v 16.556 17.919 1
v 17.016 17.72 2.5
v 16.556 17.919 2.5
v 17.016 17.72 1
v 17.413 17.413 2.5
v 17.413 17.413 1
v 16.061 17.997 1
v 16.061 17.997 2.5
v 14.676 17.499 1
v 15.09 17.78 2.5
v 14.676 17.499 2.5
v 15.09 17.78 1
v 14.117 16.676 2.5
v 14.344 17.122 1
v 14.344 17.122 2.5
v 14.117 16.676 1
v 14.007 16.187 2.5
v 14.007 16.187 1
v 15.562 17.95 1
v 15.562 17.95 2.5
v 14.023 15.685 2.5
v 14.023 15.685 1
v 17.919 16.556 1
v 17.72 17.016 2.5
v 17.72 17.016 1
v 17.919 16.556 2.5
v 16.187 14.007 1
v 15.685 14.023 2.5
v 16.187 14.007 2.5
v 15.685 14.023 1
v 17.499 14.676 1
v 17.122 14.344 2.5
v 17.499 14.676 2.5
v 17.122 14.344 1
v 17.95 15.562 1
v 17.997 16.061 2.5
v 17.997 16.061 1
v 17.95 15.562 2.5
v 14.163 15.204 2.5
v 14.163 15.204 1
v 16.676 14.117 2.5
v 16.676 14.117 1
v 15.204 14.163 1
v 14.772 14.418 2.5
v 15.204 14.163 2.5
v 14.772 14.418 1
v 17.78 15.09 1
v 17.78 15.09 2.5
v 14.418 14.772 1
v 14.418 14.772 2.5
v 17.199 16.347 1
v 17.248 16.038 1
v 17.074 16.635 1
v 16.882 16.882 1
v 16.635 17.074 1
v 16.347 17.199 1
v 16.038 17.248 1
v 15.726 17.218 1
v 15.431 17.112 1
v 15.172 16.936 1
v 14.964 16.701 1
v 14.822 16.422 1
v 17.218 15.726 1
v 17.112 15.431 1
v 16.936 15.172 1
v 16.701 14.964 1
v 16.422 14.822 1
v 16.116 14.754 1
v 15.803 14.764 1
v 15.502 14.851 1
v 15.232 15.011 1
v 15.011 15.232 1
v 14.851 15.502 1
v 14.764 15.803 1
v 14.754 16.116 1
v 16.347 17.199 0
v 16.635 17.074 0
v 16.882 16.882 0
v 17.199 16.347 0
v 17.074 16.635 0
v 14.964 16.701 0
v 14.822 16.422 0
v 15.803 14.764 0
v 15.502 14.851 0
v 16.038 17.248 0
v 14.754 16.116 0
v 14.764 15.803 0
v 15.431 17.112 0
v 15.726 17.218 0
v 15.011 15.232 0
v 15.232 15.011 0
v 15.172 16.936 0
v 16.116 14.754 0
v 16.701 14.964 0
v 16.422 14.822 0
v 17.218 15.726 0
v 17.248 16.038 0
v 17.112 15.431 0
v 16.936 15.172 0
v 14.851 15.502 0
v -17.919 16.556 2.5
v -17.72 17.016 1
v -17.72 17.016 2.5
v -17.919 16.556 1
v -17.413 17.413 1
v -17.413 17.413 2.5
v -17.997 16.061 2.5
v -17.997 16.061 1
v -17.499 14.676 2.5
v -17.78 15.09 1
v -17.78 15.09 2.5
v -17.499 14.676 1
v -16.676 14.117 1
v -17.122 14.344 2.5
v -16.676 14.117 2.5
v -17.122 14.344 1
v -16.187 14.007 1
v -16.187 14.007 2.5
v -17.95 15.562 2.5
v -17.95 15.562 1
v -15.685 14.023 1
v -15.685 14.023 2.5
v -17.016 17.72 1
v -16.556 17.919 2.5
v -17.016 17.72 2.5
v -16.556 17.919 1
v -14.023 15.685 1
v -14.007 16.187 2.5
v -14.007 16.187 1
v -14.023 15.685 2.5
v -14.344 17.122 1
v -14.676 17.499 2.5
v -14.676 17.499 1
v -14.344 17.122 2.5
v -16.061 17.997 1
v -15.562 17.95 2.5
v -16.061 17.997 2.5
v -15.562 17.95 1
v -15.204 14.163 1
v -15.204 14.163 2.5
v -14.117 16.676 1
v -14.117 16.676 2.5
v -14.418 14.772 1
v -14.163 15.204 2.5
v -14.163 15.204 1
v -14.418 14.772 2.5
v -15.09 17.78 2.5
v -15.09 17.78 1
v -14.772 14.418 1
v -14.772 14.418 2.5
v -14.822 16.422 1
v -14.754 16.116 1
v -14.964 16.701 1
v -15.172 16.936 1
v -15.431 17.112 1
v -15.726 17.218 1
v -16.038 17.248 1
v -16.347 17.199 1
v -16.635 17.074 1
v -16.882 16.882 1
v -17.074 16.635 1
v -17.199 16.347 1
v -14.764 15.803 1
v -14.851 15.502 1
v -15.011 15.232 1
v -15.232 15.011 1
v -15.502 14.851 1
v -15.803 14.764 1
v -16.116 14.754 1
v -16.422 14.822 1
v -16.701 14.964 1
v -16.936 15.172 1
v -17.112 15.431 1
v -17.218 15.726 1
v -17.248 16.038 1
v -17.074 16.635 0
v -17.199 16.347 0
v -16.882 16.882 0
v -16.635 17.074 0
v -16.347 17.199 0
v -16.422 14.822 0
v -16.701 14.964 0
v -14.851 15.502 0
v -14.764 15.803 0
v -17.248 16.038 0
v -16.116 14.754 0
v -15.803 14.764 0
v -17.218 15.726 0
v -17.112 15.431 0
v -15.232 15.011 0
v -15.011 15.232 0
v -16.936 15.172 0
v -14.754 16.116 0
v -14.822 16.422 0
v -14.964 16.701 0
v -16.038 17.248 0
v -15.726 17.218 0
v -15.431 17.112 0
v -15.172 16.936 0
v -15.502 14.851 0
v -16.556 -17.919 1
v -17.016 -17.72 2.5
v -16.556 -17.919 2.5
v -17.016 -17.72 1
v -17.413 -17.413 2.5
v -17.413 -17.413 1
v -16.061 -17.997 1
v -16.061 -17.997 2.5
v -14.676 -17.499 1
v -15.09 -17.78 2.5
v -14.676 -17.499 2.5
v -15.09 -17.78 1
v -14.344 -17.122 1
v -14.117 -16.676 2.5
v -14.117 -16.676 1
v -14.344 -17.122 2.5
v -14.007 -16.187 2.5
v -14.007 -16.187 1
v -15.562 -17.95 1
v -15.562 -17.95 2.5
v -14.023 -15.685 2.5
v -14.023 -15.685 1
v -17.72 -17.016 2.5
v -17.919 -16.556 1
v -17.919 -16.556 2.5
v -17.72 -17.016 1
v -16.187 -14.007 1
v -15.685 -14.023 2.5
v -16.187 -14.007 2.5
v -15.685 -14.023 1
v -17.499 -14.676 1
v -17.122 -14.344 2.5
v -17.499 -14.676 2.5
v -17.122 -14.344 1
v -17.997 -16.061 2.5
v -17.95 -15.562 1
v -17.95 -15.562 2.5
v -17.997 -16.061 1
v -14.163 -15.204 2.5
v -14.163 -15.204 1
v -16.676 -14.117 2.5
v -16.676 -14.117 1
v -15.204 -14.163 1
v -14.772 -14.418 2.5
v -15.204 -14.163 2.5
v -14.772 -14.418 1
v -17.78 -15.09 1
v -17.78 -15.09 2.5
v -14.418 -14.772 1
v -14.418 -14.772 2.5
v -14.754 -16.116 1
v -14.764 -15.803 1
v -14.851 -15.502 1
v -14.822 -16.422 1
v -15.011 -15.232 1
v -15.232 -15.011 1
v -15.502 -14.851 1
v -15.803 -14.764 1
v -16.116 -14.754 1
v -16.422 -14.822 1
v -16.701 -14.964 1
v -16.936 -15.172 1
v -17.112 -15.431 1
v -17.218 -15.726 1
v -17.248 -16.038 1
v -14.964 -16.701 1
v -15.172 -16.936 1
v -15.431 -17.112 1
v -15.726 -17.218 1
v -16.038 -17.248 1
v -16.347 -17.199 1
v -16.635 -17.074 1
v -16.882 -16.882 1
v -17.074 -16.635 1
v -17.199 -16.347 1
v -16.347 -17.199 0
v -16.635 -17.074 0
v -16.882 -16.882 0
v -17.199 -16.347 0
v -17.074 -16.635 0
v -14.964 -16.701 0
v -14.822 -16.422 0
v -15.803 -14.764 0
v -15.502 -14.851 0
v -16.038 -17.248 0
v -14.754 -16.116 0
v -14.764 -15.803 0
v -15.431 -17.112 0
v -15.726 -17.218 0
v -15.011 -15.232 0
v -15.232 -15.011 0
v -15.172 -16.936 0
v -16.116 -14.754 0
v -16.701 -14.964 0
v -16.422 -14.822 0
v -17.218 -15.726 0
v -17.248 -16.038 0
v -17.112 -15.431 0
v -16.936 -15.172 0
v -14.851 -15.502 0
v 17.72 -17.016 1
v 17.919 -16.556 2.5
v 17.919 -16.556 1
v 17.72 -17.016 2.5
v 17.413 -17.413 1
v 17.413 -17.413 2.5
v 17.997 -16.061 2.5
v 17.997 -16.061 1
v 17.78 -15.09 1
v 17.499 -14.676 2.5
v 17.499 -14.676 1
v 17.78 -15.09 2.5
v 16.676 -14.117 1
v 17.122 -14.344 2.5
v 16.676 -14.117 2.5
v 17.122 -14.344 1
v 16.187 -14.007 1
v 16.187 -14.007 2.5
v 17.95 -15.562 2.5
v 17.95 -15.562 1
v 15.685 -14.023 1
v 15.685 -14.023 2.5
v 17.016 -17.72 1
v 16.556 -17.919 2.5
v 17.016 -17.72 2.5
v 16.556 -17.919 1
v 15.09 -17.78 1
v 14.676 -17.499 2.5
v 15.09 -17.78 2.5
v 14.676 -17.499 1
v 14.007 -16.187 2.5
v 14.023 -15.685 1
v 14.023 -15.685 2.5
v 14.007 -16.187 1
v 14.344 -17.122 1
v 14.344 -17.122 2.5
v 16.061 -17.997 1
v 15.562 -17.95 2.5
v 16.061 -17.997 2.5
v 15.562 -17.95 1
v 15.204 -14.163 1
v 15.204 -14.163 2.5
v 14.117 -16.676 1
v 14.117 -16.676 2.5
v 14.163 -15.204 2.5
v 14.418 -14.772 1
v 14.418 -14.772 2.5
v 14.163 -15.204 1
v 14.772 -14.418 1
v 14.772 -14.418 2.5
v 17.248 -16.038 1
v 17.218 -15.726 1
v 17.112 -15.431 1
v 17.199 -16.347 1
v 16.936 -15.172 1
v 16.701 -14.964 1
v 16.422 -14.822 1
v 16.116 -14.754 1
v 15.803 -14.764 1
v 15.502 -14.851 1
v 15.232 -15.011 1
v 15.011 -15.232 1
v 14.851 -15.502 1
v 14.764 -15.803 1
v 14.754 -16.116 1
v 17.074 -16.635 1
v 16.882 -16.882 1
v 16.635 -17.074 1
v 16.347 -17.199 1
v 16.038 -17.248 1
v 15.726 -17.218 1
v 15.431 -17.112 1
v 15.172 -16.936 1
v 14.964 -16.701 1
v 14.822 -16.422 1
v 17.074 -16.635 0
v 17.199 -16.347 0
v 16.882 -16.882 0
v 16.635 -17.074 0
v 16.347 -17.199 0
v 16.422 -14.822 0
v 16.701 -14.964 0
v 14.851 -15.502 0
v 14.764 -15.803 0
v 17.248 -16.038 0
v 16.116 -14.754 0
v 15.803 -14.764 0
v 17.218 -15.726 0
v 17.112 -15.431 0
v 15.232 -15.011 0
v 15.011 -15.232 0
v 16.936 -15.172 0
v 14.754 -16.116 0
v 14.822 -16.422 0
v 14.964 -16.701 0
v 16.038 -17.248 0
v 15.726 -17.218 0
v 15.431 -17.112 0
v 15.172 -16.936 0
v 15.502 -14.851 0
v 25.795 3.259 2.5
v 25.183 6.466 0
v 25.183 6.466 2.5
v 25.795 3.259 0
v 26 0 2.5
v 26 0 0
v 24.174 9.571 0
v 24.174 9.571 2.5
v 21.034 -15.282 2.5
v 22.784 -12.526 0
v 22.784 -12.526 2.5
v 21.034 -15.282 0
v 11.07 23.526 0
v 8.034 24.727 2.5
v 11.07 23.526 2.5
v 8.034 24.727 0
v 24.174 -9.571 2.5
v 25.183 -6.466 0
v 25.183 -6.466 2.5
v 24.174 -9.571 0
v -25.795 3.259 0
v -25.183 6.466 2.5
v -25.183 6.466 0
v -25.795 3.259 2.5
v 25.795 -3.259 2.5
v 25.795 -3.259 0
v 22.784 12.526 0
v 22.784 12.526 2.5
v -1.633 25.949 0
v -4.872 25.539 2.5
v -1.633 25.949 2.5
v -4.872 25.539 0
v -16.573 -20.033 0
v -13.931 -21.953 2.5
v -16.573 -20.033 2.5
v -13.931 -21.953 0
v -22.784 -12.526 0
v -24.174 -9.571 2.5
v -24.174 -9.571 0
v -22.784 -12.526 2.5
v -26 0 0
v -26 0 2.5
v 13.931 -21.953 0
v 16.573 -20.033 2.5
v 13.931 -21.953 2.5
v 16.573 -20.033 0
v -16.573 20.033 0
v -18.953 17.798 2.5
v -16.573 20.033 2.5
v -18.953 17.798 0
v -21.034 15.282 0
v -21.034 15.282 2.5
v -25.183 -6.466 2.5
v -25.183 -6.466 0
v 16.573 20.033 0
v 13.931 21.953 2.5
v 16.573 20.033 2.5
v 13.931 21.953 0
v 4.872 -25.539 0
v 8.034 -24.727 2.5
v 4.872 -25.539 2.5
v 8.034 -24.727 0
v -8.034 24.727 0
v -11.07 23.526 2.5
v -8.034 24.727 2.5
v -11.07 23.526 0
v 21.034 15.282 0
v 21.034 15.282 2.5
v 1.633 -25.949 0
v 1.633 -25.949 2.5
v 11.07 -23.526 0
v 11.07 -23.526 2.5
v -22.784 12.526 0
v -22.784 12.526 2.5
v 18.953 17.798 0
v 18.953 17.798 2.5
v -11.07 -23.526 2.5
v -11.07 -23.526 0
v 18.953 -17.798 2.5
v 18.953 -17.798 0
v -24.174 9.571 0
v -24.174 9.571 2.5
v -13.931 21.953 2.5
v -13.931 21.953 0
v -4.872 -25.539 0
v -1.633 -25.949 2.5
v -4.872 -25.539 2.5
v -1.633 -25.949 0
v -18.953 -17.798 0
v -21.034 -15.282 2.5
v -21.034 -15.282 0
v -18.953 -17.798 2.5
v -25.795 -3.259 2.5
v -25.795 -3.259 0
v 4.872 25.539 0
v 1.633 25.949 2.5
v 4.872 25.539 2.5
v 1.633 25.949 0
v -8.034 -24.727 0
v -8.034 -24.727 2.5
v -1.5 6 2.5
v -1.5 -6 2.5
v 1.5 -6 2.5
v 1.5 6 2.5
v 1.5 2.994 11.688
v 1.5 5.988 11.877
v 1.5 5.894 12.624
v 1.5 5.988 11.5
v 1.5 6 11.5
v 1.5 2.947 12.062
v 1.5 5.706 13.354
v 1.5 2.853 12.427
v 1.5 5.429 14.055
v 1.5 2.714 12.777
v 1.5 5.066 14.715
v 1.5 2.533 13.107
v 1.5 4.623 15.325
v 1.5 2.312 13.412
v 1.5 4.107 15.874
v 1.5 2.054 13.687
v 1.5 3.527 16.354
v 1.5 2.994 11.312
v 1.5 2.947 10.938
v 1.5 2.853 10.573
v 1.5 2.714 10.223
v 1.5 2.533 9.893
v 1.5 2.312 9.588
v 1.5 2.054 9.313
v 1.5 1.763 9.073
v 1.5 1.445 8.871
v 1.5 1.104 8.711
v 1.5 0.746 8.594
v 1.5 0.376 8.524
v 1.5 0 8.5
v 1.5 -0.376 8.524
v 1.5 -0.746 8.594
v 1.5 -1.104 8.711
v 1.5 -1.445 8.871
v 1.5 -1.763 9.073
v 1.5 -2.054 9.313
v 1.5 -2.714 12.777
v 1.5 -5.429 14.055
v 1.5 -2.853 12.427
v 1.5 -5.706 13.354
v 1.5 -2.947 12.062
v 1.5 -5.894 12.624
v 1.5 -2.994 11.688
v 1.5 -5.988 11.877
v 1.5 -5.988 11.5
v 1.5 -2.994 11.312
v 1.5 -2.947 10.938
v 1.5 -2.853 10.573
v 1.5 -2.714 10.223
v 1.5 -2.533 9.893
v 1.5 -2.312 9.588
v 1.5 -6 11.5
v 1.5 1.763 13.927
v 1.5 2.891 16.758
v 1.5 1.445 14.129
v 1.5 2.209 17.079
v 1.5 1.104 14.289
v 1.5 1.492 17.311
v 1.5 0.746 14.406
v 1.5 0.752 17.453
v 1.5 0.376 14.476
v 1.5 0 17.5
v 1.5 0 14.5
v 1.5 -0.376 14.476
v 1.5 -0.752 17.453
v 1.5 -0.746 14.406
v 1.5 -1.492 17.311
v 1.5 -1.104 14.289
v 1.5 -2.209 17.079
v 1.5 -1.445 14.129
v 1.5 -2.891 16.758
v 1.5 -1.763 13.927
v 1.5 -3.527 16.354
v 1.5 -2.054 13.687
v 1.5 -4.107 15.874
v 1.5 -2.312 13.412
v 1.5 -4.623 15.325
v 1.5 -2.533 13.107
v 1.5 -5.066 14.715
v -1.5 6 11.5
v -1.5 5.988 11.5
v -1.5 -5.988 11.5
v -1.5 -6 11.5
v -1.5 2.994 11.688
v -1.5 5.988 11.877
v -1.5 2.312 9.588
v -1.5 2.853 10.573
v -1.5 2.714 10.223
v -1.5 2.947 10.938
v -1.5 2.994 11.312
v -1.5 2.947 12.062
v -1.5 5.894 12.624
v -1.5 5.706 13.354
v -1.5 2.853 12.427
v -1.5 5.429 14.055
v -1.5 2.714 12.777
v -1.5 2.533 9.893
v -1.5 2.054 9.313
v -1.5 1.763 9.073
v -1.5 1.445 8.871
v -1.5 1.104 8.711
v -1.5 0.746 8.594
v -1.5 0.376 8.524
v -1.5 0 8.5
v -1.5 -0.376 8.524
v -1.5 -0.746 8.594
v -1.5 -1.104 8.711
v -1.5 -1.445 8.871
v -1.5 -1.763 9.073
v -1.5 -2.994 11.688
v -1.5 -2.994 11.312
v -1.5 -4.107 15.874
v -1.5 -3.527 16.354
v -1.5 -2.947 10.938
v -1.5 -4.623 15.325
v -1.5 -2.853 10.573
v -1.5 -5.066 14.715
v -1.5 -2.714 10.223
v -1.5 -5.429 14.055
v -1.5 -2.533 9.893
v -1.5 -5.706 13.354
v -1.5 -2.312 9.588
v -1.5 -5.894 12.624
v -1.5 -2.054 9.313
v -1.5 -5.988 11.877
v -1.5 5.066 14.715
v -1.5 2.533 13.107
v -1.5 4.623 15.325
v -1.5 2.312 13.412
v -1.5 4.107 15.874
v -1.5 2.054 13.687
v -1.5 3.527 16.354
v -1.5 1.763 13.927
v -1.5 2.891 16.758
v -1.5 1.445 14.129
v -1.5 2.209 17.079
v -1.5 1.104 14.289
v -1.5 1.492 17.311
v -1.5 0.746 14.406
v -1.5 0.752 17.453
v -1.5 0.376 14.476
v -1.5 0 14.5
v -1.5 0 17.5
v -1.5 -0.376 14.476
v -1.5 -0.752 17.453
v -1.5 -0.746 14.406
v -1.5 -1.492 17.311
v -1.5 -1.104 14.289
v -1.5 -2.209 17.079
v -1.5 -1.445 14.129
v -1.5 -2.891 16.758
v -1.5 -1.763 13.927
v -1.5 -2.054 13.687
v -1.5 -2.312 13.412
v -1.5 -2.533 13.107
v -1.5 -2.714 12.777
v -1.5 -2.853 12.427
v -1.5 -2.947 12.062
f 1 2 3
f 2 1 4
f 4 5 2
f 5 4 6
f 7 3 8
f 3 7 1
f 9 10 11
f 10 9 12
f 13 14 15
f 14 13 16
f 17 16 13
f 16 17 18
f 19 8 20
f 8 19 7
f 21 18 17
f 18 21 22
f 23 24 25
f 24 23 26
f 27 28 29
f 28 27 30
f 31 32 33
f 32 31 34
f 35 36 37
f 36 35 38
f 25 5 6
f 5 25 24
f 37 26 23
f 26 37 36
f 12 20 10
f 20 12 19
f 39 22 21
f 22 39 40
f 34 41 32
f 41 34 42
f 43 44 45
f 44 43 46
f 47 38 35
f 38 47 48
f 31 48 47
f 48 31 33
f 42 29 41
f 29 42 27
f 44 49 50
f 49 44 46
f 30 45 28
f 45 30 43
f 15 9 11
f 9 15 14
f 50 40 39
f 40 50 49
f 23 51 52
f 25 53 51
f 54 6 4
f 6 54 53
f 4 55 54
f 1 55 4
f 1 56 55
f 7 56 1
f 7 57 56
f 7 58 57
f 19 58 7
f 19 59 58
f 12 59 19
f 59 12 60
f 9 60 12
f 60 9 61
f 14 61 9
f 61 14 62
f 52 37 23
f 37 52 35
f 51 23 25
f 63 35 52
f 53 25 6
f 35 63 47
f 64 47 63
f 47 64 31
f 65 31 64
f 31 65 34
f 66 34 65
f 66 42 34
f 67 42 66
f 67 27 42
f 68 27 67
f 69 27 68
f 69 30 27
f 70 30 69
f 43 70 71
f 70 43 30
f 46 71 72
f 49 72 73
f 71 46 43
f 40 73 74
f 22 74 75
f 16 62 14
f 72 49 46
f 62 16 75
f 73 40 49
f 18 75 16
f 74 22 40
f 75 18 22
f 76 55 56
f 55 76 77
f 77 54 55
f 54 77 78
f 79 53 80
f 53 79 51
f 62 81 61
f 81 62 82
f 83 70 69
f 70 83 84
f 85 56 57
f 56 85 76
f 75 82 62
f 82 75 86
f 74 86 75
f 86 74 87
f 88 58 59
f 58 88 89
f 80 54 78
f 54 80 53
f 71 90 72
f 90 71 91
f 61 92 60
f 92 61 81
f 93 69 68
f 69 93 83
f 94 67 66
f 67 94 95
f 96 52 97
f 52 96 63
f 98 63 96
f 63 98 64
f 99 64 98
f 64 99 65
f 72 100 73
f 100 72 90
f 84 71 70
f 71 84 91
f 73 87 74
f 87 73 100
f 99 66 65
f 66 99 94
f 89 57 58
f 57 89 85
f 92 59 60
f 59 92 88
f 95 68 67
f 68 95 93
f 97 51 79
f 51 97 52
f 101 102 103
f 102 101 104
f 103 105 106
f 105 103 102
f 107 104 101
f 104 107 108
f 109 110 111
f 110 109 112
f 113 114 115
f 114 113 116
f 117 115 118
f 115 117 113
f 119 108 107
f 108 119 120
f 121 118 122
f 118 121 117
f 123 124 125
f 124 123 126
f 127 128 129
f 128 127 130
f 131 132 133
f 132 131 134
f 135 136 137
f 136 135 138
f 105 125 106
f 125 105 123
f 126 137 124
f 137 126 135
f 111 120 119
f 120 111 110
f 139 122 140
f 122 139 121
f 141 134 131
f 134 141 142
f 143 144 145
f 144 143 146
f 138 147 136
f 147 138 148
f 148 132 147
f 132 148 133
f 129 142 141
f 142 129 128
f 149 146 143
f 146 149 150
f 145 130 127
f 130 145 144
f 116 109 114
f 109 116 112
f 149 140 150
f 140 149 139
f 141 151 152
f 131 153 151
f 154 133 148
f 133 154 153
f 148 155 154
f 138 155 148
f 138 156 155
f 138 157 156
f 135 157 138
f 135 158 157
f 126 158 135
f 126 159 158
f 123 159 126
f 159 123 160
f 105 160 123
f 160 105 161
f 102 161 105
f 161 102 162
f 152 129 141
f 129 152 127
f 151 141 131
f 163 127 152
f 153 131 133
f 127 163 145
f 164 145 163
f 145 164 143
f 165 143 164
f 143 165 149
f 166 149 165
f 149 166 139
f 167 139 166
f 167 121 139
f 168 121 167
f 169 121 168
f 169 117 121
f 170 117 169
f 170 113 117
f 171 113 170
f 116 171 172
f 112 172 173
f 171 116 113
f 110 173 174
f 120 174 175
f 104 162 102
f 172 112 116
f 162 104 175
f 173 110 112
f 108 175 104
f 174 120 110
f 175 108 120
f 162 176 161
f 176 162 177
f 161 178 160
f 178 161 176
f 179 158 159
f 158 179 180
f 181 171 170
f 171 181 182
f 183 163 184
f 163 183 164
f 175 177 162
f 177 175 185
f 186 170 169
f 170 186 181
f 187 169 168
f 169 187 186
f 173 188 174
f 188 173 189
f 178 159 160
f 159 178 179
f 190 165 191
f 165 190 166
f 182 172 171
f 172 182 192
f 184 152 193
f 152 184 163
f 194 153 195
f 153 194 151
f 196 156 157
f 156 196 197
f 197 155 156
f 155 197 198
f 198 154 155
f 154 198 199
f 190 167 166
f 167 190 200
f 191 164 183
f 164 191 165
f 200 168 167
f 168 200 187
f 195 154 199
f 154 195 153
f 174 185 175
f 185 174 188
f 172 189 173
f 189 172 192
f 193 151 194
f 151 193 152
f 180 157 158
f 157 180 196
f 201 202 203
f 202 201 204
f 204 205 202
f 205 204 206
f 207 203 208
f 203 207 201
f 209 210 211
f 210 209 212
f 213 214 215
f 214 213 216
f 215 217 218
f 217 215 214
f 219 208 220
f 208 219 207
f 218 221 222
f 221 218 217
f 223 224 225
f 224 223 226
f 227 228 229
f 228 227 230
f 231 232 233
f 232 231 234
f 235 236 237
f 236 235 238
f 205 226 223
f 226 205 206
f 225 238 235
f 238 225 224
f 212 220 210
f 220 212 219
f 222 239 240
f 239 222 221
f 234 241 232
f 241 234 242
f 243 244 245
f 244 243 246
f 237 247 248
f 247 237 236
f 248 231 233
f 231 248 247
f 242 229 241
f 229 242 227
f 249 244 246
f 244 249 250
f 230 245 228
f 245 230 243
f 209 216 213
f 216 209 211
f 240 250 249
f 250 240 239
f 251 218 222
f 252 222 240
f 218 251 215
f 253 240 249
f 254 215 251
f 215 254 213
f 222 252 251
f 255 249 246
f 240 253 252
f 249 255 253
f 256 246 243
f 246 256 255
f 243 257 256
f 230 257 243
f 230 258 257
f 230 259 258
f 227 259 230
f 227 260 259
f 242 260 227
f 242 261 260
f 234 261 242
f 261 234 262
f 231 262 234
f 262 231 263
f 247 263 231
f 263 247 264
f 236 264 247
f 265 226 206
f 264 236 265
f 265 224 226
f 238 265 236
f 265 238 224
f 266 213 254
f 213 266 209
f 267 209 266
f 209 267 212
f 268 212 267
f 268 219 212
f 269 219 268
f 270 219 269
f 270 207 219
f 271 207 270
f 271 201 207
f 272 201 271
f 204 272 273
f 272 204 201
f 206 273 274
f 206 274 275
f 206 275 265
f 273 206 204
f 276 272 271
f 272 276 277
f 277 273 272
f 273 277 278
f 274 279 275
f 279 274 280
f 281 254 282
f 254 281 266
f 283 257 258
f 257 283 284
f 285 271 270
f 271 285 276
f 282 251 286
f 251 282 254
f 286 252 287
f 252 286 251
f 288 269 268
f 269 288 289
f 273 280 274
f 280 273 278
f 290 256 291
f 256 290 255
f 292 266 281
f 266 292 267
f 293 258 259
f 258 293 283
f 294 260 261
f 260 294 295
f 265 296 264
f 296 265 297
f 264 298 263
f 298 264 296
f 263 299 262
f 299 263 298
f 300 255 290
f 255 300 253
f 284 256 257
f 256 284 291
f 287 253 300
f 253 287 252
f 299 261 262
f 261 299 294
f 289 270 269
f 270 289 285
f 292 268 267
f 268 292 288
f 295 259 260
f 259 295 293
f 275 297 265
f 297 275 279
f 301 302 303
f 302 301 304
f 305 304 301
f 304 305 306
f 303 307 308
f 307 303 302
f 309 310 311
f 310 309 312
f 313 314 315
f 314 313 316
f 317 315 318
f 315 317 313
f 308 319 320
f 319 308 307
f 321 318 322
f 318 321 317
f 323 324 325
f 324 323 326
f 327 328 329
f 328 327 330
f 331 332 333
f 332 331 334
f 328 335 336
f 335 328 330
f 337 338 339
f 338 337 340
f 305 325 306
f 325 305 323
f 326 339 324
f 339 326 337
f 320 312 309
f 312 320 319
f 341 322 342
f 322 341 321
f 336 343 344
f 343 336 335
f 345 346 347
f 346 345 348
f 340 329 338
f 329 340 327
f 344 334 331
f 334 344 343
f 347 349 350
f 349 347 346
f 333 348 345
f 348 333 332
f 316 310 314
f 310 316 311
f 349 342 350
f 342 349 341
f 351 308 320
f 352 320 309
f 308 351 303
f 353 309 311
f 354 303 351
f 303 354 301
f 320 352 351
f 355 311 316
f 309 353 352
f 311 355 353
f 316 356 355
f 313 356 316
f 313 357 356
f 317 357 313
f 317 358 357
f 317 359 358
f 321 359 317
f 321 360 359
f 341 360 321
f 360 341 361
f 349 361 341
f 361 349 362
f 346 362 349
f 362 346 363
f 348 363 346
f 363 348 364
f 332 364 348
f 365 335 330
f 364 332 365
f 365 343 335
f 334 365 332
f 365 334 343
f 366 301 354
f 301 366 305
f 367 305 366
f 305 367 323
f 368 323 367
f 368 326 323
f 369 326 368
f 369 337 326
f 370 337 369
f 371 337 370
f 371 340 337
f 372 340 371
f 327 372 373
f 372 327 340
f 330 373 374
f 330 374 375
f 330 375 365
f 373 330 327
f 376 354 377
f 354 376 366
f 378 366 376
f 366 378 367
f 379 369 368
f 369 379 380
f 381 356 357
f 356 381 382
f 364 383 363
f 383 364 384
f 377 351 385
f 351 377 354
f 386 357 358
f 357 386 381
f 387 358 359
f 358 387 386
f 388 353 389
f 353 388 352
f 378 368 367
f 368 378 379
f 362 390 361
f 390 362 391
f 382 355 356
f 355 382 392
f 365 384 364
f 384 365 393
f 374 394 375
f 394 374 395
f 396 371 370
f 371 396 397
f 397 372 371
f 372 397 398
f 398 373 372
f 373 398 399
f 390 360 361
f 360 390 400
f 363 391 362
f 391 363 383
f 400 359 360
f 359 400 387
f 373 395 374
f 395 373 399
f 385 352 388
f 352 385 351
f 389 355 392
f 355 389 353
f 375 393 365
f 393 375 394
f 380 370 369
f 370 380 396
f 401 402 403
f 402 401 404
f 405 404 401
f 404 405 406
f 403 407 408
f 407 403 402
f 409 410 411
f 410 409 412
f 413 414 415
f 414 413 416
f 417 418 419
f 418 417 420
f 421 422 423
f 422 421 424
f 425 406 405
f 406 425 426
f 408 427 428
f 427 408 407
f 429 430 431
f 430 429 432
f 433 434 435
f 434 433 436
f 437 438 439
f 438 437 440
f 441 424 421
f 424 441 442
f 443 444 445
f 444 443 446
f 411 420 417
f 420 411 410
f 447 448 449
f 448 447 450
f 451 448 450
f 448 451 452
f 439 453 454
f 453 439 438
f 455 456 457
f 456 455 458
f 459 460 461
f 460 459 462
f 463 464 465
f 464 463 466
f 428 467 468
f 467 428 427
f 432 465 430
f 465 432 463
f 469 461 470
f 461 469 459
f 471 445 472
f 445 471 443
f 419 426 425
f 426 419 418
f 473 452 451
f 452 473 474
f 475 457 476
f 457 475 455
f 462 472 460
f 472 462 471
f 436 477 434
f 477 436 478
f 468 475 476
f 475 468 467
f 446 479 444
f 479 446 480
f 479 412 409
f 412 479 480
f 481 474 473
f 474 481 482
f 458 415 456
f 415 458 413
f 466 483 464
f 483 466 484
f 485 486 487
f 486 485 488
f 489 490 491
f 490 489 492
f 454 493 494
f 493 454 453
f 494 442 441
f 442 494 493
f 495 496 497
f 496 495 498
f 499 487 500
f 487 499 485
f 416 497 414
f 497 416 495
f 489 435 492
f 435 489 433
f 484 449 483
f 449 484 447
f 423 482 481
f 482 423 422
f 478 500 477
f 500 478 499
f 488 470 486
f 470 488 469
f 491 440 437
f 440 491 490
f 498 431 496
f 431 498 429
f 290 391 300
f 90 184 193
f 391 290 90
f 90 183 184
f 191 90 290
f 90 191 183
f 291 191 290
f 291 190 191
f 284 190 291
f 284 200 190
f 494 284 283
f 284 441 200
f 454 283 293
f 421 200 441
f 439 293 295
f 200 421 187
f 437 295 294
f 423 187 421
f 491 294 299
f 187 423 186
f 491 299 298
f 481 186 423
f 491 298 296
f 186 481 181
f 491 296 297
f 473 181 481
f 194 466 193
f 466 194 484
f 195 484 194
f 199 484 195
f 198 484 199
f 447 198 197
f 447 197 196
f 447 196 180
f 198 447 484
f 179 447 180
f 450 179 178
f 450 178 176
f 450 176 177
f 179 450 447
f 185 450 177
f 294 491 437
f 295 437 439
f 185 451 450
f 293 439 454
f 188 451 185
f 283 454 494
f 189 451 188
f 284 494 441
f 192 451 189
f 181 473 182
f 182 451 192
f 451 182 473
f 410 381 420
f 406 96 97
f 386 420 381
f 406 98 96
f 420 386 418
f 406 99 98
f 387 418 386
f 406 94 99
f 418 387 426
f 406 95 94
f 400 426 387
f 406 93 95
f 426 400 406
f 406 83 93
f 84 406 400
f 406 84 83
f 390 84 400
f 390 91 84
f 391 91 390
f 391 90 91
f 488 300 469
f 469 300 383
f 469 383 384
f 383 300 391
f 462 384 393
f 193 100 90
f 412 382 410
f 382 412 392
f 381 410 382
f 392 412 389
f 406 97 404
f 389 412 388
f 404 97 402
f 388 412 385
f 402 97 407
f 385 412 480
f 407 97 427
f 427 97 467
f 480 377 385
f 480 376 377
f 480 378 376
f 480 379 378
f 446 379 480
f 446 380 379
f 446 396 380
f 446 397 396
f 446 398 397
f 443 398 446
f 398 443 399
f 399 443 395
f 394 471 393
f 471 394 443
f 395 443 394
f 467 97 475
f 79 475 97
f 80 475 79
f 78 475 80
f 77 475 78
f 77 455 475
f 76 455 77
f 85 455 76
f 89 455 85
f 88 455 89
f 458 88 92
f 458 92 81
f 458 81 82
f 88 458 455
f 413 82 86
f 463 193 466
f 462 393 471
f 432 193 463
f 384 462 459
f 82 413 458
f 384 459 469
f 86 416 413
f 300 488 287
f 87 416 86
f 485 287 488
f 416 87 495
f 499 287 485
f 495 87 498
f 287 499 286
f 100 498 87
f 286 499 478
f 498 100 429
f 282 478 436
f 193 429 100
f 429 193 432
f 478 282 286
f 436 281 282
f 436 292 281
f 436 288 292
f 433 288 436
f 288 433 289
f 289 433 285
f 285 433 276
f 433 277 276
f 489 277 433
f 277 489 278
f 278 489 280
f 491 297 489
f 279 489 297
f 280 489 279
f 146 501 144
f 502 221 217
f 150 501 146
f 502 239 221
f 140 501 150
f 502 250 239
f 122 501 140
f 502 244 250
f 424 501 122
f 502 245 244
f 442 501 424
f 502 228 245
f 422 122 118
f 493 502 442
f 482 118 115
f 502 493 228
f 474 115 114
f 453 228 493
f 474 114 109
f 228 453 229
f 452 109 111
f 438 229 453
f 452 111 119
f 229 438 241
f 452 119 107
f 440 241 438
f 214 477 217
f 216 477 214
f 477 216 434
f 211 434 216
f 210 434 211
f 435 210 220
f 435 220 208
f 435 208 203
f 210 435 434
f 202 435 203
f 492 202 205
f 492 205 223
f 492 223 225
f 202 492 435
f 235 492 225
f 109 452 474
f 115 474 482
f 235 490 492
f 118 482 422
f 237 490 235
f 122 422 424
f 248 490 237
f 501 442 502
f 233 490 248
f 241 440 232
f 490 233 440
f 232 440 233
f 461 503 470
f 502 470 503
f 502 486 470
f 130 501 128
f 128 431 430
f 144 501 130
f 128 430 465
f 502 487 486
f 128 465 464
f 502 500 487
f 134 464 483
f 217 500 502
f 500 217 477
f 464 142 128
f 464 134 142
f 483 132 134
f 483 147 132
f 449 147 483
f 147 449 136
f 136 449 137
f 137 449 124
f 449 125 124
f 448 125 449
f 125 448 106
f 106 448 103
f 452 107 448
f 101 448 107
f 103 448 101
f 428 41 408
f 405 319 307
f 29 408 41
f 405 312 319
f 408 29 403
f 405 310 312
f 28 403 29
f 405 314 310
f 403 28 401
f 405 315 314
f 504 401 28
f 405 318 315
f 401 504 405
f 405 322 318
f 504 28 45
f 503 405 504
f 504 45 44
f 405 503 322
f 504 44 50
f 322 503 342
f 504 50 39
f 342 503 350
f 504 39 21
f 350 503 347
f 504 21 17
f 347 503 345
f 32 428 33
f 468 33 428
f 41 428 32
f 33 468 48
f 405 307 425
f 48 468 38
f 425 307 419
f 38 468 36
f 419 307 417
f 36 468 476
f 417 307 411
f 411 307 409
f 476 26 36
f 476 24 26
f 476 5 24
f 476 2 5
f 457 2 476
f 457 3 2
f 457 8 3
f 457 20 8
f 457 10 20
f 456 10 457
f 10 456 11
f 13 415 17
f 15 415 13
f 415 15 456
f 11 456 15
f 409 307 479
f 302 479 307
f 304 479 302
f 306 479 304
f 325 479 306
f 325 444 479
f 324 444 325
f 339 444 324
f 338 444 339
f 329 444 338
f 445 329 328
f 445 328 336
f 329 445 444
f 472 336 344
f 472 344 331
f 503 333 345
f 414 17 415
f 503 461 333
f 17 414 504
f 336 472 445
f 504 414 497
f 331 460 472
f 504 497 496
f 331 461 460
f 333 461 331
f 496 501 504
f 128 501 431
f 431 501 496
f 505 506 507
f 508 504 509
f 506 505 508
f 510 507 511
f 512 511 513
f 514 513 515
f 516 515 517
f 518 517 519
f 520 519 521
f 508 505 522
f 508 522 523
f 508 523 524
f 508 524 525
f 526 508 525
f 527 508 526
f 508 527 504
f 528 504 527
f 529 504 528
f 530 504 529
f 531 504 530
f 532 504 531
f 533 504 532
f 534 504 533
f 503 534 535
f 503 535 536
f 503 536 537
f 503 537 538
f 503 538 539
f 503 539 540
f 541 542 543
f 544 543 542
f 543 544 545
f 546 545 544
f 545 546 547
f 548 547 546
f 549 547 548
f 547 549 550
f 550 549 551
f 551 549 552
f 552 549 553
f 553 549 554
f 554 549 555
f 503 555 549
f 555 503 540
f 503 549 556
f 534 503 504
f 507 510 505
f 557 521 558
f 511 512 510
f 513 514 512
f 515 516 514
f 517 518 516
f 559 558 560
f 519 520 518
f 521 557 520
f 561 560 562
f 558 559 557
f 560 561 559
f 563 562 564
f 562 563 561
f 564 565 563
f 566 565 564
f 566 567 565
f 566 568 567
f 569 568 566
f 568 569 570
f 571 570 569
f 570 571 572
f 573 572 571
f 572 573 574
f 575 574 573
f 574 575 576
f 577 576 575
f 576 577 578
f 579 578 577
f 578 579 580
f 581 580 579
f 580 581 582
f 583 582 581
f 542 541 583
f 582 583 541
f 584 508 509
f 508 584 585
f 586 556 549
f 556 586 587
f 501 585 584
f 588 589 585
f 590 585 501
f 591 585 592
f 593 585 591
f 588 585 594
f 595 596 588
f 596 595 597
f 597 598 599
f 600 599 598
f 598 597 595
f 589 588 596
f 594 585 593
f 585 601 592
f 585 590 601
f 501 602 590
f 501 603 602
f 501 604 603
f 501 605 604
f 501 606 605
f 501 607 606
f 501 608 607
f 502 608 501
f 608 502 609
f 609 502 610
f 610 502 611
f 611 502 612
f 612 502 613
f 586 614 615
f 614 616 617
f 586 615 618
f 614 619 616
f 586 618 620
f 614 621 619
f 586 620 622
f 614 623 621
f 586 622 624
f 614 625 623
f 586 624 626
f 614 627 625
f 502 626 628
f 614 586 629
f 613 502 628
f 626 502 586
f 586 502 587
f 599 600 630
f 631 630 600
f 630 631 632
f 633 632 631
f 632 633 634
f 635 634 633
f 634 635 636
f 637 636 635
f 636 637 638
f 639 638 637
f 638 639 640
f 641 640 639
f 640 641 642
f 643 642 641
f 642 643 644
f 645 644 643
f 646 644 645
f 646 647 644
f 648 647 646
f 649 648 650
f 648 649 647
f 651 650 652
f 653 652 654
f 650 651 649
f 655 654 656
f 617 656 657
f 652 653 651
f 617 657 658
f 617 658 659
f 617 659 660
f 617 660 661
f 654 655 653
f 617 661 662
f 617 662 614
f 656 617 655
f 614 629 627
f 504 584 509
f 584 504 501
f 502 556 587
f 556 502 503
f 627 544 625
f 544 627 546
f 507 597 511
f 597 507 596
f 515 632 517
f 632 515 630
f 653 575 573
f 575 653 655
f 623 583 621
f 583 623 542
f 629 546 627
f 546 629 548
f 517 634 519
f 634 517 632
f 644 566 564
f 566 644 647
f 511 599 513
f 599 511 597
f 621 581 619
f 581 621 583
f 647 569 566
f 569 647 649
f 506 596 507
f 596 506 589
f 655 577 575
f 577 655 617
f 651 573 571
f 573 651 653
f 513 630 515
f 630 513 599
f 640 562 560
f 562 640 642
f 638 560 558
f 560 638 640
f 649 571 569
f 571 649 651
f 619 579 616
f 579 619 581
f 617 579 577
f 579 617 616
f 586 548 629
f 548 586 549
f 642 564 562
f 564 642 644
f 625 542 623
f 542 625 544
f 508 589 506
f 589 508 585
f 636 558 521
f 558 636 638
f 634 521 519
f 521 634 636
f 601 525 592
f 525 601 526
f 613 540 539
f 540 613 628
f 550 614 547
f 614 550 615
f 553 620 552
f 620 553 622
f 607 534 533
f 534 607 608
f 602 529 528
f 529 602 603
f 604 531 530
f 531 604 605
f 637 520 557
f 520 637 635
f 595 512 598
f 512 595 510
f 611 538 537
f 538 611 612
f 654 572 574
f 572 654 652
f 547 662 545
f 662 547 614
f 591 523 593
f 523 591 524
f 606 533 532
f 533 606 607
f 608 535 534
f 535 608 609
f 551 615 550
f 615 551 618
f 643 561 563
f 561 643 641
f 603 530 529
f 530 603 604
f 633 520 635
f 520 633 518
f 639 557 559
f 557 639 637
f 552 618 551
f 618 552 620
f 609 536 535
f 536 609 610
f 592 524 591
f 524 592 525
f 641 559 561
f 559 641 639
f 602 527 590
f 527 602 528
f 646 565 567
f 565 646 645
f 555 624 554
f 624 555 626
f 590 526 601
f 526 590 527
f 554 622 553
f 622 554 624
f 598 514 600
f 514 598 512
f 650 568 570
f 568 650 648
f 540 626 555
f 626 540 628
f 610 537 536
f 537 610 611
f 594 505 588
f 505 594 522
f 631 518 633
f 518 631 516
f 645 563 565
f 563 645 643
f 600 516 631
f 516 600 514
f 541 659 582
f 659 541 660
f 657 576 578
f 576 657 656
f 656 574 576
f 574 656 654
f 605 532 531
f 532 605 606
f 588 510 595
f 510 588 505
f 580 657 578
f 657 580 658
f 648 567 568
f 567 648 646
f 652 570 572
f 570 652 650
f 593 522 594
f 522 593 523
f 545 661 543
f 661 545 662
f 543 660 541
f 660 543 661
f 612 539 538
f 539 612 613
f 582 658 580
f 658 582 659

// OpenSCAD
coverDiameter = 52;
screwDiameter = 2.5;
screwHeadDiameter = 4;
screwPosition = 22.625;
hookWidth = 3;
hookDiameter = 12;
hookHeight = 11.5;
hookScrewDiameter = 6;

module cover(d, screwDiameter, screwHeadDiameter, screwPosition) {
    difference() {
        cylinder(r=d/2, h=2.5, $fn=50);
    
        for (rotate1 = [ 45 : 90 : 315 ]) {
            rotate([0,0,rotate1]) {
                translate([screwPosition,0,1]) {
                    cylinder(r=screwHeadDiameter/2, h=10, $fn=25);
                }
                translate([screwPosition,0,-1]) {
                    cylinder(r=screwDiameter/2, h=10, $fn=25);
                }
            }
        }
    }
}


module hook(w,d,h,holeRadius) {
    difference() {
        union() {
            translate([-w/2, -d/2, 0]) {
                cube([w,d,h]);
            }
            translate([0,0,h]) {
                rotate([0,90,0]) {
                    cylinder(r=d/2, h=w, center=true, $fn=50);
                }
            }
        }
        translate([0,0,h]) {
            rotate([0,90,0]) {
                cylinder(r=holeRadius, h=w+2, center=true, $fn=50);
            }
        }
    }
}

cover(d=coverDiameter, screwDiameter=screwDiameter, screwHeadDiameter=screwHeadDiameter, screwPosition=screwPosition);
hook(hookWidth,hookDiameter,hookHeight,hookScrewDiameter/2);
